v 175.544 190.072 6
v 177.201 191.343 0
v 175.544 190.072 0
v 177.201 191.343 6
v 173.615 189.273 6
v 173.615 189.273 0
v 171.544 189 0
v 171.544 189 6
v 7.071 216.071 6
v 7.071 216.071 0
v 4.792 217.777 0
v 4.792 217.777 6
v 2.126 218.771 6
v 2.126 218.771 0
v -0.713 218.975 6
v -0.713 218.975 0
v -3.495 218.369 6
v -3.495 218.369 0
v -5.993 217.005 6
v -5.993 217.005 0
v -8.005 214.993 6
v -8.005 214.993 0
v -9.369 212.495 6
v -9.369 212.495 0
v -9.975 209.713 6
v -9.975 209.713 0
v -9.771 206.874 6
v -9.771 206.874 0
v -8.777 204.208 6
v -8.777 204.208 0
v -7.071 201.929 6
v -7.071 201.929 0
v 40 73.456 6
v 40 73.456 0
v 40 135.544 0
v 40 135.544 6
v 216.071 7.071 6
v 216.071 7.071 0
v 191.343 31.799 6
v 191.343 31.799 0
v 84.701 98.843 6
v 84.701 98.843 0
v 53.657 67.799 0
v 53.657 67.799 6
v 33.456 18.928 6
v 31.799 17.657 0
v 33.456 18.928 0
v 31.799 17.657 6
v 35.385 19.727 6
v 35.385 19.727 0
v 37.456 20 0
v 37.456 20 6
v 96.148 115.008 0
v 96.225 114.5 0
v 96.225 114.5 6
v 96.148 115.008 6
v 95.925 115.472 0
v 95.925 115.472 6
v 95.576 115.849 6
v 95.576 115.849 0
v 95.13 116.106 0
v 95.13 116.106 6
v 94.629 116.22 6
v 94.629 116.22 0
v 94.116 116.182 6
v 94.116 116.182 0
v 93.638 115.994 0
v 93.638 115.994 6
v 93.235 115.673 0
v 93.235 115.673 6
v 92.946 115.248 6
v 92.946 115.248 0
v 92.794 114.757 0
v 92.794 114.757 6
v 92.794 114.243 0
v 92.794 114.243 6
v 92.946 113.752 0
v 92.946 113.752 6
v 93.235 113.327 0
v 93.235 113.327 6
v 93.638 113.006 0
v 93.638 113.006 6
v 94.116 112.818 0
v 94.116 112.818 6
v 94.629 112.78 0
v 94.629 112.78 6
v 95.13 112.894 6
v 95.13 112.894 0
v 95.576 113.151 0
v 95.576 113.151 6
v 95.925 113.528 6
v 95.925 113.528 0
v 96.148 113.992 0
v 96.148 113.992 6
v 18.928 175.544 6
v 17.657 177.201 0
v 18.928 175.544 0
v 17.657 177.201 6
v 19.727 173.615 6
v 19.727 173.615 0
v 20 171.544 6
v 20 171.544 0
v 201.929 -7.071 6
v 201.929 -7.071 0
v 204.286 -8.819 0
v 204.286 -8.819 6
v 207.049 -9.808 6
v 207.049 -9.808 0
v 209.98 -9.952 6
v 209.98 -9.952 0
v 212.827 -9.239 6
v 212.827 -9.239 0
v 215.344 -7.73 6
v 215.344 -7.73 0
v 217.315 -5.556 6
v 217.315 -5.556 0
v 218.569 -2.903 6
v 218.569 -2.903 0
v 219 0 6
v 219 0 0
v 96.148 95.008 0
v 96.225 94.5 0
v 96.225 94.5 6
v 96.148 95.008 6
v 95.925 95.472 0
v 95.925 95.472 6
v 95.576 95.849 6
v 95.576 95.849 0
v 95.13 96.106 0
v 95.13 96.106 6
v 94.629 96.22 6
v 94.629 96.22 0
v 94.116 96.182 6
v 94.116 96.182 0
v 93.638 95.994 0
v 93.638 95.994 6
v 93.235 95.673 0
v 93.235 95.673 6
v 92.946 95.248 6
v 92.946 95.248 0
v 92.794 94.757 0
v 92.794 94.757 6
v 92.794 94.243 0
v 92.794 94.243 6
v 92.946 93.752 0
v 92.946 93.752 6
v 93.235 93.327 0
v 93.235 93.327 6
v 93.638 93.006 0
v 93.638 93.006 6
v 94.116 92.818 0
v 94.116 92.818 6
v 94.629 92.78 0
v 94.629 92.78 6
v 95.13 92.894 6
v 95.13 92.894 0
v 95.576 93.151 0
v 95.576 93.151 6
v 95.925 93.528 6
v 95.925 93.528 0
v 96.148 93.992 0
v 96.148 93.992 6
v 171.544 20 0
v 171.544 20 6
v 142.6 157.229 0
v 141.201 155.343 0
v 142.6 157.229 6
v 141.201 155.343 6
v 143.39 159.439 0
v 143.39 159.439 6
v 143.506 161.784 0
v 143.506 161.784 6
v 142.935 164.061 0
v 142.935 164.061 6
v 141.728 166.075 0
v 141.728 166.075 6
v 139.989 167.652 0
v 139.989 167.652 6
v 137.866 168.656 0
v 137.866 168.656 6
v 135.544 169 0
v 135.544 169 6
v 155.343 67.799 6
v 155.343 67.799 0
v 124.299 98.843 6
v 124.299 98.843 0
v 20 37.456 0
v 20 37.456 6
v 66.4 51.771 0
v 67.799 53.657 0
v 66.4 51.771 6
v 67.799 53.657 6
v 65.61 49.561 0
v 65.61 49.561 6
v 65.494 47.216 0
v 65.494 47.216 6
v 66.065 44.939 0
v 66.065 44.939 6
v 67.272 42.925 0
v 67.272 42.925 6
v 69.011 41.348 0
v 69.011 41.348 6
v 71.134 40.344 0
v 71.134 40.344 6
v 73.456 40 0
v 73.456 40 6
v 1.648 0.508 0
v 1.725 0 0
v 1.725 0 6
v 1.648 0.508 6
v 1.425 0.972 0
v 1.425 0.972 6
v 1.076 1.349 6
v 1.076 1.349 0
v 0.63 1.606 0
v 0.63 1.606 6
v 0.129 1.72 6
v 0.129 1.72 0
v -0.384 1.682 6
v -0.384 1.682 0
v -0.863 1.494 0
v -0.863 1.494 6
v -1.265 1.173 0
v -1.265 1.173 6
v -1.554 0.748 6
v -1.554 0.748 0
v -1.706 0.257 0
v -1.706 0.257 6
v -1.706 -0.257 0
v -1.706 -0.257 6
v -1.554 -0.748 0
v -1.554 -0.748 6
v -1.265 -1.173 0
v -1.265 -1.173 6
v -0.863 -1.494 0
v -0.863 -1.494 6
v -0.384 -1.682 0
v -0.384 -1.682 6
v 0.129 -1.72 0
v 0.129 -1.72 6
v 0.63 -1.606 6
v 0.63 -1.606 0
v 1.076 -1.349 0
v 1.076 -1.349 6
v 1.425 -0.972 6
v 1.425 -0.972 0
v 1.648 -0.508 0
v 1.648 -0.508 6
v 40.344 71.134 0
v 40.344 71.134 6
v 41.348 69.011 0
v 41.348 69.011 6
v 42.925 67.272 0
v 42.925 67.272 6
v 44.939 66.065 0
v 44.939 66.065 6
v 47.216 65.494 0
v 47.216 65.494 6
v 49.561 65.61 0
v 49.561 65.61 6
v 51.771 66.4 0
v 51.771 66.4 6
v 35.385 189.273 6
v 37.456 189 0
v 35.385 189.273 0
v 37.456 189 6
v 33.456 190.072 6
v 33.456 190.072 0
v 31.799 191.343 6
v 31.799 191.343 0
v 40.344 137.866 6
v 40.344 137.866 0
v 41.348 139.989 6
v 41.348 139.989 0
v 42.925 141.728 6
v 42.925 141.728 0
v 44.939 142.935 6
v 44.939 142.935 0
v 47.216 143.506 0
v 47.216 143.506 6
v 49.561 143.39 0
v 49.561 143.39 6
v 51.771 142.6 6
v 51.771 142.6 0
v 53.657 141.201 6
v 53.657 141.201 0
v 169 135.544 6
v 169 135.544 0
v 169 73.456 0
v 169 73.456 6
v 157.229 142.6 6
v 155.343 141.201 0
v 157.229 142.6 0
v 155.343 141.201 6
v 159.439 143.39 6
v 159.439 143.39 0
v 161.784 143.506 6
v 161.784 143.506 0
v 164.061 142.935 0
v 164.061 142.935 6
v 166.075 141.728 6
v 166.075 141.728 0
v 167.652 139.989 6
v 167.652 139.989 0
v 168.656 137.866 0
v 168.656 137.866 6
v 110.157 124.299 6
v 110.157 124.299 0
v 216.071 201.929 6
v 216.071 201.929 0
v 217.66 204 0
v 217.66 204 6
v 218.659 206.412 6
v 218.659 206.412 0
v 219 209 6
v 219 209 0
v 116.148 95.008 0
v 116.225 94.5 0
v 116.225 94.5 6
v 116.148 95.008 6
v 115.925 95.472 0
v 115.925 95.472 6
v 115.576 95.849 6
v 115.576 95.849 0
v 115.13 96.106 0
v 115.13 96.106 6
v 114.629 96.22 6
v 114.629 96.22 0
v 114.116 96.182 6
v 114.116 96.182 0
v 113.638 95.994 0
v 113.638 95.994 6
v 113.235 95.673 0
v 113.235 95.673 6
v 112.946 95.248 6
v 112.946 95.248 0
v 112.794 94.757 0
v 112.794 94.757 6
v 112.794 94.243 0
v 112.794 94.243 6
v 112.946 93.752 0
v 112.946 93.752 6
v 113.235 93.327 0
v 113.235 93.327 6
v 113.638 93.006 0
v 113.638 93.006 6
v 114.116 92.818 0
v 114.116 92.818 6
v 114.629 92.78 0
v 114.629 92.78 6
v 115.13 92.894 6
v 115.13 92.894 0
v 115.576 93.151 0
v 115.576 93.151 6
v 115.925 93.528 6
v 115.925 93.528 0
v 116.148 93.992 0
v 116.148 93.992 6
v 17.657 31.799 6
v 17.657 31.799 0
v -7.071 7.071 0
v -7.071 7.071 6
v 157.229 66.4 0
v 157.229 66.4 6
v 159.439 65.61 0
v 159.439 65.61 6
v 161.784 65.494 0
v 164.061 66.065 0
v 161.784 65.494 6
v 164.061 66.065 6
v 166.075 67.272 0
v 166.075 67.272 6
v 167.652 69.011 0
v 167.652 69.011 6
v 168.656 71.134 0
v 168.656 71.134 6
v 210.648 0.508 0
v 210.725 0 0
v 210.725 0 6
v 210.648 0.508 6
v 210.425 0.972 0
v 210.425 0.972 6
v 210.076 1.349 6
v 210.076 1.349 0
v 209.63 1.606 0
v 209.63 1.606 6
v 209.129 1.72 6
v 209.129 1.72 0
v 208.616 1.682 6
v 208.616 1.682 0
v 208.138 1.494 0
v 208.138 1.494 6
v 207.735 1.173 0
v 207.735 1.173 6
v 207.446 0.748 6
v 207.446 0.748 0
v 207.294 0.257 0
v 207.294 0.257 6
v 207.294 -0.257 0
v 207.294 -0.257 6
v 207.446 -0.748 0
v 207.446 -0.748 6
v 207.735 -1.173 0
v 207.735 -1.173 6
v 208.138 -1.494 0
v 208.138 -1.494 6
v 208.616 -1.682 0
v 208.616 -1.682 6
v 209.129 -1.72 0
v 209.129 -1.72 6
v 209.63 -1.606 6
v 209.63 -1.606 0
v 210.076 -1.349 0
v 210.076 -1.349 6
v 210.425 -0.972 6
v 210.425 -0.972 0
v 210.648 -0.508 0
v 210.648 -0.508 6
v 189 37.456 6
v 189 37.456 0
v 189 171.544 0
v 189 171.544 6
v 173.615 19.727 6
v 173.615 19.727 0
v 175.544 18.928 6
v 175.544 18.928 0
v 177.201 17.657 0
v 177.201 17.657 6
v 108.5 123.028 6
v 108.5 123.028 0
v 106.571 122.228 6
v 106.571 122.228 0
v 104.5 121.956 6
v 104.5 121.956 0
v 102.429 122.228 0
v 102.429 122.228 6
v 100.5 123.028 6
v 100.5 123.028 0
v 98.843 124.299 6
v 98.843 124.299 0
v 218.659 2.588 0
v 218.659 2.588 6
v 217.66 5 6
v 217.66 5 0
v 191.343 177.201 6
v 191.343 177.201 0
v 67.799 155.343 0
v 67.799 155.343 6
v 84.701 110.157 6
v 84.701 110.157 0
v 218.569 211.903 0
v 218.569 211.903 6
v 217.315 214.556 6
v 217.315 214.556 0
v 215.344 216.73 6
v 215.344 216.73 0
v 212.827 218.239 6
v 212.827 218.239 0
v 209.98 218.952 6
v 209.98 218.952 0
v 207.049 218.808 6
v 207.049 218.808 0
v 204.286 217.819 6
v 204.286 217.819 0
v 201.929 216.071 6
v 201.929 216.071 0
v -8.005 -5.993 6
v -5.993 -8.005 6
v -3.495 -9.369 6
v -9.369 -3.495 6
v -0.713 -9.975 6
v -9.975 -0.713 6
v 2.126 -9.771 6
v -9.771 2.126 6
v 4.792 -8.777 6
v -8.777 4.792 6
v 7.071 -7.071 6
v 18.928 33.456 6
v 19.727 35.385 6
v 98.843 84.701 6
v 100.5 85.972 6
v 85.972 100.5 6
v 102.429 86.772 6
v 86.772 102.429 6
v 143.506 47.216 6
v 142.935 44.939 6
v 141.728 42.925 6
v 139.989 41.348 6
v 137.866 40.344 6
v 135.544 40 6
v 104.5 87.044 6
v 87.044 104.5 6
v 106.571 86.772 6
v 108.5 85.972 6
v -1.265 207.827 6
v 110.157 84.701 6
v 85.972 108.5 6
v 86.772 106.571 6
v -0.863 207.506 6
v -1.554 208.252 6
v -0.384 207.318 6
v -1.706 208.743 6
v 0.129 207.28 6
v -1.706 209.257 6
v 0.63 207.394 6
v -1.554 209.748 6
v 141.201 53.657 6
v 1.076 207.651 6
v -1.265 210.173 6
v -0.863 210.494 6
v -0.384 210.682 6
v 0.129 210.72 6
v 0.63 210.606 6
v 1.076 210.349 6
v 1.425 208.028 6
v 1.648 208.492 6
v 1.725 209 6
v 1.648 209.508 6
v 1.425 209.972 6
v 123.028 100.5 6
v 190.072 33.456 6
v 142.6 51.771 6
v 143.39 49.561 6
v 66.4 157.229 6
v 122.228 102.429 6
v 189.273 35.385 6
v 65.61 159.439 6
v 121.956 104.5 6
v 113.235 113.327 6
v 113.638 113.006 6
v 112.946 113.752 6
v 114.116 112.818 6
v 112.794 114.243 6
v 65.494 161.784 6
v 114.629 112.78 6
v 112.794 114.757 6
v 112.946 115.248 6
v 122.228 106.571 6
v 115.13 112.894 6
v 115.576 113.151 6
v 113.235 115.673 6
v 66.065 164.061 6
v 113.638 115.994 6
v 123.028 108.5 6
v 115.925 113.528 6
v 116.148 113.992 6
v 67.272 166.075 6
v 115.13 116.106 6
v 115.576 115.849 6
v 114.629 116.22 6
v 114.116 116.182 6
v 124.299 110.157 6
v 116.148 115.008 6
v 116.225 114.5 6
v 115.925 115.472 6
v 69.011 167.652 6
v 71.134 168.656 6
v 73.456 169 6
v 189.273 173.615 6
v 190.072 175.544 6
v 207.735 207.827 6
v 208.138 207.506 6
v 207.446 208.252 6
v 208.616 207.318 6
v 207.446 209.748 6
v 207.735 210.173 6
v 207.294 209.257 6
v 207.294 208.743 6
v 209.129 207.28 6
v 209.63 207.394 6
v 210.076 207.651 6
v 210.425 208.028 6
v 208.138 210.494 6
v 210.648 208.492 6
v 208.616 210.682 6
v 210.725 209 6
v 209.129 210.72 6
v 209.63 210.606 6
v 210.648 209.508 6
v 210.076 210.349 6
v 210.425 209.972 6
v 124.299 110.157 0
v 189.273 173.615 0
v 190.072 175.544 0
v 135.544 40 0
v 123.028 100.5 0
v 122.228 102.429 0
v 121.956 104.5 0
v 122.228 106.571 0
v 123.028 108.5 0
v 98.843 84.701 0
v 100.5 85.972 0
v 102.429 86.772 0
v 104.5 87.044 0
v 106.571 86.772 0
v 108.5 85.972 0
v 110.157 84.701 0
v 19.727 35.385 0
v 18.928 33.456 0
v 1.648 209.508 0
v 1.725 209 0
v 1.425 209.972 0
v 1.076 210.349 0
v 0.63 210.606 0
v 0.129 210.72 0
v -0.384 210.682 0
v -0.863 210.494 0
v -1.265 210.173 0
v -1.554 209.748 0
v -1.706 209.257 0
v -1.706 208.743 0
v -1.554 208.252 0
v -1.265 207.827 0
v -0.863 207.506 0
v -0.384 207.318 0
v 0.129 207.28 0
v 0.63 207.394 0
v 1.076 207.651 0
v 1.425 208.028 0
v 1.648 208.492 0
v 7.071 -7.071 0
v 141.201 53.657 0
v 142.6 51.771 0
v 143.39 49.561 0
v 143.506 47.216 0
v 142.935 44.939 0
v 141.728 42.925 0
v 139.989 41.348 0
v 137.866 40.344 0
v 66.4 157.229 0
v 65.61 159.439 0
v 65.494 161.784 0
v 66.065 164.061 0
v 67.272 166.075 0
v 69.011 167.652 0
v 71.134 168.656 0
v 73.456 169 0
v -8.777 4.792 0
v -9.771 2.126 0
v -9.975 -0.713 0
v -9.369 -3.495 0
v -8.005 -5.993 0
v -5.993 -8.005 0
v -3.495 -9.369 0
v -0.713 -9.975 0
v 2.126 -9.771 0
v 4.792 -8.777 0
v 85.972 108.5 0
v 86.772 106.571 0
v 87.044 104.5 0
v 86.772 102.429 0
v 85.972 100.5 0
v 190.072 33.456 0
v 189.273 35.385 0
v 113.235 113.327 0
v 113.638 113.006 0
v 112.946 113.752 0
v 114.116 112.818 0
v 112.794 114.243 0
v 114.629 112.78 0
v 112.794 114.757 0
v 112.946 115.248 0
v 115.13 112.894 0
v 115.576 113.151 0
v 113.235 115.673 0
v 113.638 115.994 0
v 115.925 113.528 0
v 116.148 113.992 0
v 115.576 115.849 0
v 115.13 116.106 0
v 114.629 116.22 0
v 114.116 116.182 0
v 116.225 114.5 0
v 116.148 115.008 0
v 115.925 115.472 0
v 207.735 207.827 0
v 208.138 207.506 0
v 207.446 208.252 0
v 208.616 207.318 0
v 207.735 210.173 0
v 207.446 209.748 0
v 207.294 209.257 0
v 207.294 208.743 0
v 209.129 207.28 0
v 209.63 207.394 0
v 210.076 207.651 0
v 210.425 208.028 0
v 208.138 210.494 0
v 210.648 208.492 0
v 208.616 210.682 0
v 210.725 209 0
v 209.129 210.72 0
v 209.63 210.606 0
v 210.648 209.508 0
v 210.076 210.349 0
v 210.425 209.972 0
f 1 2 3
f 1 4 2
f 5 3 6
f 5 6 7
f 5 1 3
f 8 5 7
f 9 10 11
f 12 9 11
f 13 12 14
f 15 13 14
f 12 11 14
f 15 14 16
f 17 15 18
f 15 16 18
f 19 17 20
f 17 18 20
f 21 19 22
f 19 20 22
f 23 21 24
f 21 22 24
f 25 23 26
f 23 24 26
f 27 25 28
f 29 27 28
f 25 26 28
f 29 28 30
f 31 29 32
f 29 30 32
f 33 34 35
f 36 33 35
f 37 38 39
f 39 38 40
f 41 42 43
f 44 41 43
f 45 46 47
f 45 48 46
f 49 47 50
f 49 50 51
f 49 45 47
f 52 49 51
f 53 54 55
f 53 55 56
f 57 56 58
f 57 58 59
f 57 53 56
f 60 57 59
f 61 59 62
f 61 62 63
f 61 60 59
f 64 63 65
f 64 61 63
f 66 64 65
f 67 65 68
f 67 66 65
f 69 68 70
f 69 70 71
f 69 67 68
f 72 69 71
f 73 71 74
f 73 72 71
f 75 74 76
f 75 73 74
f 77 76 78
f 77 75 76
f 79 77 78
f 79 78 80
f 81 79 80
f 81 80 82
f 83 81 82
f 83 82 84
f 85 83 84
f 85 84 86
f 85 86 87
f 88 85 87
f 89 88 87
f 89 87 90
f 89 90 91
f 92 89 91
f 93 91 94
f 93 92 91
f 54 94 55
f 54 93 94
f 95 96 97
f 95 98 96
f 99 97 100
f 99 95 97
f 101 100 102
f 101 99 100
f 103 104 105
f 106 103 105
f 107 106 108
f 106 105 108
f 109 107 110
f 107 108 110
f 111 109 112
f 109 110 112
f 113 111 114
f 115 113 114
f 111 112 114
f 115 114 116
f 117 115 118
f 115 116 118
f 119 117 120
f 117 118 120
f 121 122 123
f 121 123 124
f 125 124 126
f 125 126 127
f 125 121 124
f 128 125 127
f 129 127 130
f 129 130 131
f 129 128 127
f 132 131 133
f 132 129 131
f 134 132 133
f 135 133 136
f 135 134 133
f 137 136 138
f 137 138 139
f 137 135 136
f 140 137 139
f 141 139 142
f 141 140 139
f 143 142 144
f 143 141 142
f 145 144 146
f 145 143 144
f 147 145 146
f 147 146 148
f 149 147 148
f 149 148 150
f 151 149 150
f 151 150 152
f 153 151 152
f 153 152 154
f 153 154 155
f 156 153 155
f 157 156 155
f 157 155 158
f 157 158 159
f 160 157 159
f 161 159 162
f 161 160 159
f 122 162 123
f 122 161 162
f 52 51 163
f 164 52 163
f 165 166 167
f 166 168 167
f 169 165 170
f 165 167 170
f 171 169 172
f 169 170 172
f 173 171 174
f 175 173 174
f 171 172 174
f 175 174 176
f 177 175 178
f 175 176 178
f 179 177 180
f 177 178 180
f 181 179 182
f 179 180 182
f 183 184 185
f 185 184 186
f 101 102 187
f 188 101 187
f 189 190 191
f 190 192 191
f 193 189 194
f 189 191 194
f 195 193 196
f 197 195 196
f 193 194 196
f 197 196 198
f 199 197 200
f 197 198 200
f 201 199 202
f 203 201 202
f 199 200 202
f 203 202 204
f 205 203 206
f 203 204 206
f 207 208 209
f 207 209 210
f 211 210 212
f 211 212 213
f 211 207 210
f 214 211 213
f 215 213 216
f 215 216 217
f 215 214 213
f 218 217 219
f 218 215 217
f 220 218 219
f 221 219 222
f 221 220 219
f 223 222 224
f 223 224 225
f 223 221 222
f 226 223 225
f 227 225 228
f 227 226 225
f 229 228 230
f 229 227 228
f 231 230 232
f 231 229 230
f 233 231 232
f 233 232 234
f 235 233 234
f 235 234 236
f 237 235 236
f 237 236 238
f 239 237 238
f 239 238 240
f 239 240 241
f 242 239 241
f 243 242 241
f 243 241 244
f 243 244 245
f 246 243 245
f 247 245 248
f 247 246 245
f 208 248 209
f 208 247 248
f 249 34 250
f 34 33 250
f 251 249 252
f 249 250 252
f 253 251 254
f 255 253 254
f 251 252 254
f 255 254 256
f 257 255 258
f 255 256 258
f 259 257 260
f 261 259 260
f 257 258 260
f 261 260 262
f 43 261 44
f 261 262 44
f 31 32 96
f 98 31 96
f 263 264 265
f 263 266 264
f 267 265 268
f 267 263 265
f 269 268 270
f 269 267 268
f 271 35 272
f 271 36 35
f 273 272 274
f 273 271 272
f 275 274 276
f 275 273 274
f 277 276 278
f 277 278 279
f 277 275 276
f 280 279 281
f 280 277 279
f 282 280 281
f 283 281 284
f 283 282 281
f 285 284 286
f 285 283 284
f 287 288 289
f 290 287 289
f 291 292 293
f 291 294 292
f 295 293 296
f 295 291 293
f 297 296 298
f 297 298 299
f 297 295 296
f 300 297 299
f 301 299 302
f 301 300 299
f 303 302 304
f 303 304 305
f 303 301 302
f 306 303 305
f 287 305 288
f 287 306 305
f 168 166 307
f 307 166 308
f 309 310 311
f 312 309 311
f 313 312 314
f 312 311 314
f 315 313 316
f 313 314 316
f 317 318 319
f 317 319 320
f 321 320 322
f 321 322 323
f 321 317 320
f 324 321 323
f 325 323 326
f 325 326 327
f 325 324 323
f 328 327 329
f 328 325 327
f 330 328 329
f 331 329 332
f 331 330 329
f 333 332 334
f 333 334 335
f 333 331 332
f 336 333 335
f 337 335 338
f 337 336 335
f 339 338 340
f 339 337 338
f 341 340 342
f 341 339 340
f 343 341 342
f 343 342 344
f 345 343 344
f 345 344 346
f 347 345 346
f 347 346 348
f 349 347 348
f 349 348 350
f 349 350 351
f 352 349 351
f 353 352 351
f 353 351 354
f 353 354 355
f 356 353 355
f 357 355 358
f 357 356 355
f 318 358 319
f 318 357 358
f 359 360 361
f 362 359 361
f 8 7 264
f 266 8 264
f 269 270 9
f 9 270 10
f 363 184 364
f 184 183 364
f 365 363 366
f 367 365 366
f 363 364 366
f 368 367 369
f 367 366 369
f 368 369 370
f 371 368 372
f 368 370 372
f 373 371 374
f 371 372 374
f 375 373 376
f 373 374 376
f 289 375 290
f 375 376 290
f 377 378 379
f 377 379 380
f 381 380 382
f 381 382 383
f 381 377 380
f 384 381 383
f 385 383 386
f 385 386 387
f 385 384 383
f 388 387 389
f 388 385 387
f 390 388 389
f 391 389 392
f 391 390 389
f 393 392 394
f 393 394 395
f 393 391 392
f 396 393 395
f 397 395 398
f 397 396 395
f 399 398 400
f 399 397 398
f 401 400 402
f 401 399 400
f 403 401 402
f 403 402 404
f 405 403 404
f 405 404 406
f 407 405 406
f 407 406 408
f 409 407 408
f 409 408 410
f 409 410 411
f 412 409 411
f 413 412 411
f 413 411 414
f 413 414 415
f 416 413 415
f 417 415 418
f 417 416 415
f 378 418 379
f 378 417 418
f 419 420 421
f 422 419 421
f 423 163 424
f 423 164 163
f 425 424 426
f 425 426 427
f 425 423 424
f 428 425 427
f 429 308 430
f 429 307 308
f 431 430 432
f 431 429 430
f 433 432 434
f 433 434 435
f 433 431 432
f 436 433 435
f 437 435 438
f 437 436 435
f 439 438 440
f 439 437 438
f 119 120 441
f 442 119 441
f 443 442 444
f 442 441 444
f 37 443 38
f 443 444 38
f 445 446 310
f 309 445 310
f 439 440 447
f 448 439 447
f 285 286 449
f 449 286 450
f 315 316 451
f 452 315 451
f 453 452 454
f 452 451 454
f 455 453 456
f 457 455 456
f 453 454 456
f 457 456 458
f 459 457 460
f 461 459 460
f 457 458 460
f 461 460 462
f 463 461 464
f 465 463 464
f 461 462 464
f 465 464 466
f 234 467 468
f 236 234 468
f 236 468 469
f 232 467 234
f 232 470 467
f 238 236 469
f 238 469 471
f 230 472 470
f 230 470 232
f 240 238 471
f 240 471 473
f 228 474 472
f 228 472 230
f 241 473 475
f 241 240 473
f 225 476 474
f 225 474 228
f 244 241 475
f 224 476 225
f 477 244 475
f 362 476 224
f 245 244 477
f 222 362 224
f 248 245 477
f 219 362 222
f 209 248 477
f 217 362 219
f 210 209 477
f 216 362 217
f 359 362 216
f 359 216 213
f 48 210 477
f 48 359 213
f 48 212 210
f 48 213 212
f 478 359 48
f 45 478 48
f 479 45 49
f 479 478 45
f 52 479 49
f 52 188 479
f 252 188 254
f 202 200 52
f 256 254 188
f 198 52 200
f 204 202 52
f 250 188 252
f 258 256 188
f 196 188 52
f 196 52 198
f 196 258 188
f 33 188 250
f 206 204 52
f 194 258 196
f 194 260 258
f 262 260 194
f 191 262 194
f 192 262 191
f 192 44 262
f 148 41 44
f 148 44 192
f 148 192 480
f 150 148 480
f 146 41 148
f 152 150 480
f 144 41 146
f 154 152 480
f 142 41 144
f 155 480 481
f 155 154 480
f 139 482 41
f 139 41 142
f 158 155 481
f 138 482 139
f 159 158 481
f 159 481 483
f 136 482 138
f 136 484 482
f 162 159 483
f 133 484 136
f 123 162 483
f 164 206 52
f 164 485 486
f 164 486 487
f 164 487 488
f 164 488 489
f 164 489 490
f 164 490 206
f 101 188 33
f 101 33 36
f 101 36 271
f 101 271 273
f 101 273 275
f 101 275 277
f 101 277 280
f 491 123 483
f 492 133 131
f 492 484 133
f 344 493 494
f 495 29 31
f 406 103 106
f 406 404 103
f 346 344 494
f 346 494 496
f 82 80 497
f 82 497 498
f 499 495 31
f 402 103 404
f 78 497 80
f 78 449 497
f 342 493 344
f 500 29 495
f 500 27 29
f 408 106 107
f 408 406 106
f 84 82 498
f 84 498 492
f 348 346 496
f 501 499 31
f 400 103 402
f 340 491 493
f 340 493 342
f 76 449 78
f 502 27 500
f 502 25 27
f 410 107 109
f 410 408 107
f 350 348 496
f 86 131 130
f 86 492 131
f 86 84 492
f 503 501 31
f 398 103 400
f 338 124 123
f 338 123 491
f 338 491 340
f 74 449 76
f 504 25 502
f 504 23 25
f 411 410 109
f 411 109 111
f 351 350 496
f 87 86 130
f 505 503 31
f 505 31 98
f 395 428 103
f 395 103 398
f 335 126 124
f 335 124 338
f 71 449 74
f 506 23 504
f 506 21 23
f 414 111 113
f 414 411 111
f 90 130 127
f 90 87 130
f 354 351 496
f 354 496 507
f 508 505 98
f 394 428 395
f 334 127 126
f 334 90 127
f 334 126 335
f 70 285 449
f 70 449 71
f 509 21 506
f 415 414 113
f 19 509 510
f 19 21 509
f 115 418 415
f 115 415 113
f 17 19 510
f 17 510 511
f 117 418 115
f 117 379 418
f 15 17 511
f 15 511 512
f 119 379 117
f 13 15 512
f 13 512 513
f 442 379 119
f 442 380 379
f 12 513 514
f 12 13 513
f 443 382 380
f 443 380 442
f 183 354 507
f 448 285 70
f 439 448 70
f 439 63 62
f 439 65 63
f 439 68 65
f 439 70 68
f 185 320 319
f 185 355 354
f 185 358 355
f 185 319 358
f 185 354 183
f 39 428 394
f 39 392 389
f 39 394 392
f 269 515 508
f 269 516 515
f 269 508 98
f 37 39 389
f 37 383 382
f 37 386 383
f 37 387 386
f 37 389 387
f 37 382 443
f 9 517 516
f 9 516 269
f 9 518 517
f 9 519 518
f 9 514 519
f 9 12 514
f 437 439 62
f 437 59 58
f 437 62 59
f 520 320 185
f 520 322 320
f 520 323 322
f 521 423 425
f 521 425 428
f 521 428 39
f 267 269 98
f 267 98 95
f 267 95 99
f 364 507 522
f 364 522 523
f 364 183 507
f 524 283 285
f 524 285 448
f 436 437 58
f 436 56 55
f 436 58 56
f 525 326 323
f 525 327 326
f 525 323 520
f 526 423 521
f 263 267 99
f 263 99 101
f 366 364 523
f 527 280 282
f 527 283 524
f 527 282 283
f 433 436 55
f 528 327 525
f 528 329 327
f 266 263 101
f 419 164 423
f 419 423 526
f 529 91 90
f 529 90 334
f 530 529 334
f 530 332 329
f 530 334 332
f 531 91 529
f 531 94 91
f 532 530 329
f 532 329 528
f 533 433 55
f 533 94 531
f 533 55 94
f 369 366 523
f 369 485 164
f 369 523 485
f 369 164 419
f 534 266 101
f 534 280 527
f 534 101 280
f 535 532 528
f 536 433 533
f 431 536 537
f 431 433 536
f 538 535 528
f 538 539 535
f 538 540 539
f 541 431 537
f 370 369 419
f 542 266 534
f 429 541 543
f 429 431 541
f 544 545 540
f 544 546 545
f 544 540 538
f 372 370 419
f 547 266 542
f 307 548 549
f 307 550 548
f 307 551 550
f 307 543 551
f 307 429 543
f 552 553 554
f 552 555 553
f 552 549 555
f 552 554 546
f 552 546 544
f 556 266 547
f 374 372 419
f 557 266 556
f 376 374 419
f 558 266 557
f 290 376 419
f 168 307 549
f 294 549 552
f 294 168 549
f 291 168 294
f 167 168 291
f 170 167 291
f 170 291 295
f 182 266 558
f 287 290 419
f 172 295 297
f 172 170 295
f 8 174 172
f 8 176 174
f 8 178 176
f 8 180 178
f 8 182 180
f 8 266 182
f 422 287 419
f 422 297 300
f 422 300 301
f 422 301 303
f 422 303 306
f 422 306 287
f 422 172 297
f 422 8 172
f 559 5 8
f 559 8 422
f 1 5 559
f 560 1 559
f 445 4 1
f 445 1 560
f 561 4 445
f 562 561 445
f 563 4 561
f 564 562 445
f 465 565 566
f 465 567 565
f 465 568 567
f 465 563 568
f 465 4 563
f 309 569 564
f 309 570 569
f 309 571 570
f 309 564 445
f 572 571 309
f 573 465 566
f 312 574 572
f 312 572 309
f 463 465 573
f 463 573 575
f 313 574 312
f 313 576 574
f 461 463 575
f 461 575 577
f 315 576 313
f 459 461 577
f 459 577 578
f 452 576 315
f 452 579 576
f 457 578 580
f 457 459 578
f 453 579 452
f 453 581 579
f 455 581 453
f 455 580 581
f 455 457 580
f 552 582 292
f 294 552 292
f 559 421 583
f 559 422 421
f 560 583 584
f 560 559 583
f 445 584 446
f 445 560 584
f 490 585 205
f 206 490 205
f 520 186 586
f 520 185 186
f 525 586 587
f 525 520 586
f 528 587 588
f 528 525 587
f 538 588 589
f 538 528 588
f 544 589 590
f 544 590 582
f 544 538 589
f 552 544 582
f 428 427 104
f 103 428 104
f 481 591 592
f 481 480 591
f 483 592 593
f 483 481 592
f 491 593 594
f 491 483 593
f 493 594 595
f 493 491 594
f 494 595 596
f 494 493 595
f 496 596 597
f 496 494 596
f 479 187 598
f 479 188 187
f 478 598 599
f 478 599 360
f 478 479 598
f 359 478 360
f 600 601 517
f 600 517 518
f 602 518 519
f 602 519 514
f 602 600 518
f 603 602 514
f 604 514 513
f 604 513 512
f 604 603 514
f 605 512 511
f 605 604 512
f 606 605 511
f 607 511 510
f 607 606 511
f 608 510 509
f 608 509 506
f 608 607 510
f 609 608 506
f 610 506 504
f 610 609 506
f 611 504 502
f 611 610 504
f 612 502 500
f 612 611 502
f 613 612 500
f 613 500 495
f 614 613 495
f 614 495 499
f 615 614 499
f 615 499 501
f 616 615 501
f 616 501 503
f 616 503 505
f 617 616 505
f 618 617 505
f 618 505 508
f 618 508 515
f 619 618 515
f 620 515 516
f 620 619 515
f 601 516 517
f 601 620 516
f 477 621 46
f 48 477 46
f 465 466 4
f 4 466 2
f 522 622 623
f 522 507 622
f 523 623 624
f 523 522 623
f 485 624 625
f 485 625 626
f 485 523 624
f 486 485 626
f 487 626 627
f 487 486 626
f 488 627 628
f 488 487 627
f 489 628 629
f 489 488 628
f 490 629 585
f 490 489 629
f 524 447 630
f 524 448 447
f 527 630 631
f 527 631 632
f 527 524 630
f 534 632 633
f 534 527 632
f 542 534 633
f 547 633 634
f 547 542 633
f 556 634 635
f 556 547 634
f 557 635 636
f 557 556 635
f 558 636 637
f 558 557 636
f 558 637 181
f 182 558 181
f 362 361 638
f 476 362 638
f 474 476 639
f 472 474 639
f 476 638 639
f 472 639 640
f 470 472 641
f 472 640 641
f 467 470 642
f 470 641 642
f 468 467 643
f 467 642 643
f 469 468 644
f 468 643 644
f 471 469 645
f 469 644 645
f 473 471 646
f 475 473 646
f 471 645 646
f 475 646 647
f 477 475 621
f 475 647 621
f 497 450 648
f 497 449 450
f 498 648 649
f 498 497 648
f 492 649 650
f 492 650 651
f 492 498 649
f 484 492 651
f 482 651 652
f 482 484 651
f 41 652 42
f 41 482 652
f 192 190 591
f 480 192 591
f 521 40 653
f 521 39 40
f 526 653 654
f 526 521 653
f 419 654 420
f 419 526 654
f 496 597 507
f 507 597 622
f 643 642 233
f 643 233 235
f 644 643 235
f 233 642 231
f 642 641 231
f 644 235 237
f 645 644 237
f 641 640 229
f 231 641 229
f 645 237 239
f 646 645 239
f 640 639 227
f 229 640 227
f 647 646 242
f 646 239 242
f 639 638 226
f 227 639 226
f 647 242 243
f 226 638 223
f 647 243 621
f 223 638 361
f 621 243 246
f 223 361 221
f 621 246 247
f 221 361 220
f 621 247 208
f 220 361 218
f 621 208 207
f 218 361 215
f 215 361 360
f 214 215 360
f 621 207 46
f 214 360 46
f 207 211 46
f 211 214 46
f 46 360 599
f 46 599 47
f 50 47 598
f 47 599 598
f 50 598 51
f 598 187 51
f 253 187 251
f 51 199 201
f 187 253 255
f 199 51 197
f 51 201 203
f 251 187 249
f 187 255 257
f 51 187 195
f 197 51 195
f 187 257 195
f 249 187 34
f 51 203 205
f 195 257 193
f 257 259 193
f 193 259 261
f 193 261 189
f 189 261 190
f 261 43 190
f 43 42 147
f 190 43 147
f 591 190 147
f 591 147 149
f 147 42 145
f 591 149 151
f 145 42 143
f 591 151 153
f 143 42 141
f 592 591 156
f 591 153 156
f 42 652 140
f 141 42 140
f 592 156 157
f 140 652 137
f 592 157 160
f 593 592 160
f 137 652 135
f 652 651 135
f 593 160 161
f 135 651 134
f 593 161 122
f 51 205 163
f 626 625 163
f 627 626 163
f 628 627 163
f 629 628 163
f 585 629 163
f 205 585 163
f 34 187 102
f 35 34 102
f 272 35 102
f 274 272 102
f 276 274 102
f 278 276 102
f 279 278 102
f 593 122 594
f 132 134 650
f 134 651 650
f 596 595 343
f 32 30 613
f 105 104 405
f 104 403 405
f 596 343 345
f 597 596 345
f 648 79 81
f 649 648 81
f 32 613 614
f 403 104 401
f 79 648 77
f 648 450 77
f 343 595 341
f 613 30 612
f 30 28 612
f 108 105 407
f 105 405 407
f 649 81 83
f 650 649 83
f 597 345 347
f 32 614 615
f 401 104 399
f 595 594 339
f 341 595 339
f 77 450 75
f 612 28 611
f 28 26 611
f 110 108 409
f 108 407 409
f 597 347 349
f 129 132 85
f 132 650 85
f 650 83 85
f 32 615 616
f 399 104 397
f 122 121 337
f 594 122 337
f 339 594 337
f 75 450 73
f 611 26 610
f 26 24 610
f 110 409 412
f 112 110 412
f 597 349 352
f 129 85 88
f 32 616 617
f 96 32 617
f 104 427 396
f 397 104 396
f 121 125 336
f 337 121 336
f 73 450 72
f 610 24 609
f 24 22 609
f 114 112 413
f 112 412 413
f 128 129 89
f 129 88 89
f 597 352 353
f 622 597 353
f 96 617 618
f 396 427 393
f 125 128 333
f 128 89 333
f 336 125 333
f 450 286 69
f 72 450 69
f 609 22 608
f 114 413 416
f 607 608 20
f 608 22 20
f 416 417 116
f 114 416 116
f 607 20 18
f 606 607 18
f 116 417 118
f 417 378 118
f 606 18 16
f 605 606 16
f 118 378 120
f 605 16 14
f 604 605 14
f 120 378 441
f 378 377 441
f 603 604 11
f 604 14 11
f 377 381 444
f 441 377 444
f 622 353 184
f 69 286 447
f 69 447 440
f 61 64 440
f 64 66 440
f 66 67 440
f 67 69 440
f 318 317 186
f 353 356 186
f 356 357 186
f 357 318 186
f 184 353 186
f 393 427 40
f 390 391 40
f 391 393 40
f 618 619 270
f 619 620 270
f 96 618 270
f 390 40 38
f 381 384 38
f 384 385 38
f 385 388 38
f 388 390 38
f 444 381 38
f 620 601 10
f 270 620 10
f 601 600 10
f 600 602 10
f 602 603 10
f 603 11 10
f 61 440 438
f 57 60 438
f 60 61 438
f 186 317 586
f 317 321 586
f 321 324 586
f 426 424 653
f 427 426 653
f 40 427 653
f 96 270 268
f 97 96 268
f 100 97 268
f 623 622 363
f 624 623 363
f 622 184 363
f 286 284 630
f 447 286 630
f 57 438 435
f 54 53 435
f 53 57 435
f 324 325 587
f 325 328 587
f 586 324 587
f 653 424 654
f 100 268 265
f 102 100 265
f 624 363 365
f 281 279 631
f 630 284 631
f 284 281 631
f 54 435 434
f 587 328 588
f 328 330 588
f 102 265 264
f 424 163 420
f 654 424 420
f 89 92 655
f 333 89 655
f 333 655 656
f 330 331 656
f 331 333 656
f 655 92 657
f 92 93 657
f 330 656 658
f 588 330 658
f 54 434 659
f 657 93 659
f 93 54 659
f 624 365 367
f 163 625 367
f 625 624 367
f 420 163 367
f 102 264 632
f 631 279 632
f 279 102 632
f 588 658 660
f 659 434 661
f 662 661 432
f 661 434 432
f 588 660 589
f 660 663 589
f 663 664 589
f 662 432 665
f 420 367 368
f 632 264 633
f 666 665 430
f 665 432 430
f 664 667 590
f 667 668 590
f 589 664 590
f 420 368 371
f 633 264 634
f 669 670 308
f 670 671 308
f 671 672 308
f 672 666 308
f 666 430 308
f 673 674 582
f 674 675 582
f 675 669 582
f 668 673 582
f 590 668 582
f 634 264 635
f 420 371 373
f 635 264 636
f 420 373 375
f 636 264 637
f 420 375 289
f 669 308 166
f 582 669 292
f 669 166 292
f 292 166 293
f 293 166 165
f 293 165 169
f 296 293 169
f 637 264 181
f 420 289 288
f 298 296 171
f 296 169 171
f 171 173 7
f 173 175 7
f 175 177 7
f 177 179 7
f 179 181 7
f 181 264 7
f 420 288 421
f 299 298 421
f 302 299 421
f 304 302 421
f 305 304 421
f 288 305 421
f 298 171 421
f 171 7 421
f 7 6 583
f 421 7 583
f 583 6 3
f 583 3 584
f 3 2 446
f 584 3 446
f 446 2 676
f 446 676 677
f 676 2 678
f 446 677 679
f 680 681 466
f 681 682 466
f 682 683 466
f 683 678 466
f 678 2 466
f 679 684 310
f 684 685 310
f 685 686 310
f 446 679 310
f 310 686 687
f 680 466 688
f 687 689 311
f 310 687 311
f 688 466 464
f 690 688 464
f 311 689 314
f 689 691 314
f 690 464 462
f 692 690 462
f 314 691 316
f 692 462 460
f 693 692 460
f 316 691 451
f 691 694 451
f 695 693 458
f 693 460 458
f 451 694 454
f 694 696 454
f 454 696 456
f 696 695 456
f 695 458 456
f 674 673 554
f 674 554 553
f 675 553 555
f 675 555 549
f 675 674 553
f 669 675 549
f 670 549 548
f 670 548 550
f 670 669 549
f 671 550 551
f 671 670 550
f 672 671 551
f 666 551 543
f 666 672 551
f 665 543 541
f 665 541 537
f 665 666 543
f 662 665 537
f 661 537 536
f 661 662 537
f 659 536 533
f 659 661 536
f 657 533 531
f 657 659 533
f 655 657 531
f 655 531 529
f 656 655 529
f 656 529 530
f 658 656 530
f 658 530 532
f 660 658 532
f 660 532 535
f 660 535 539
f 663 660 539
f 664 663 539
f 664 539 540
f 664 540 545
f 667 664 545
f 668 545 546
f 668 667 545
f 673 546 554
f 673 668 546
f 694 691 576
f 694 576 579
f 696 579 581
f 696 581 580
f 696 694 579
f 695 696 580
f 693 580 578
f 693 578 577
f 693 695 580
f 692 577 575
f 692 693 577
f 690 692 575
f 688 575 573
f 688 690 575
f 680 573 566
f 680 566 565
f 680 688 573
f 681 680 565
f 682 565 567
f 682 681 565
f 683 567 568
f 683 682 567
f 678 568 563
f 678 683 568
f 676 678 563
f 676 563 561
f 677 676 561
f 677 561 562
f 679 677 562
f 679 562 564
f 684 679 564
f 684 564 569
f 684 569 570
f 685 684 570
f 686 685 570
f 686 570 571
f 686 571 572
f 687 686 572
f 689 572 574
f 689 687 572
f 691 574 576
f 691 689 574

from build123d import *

# Parameters (mm, degrees)
F0_R     = 1.725
F1_DEPTH = 6
F2_R     = 8


with BuildPart() as f1:
    # F0 (on Top) → F1 (new body)
    with BuildSketch(Plane.XY):
        with BuildLine():
            ThreePointArc((-7.0710678119, 201.9289321881), (3.8268343237, 199.7612046749), (10, 209))
            ThreePointArc((10, 209), (9.2387953251, 212.8268343237), (7.0710678119, 216.0710678119))
            ThreePointArc((7.0710678119, 216.0710678119), (-7.0710678119, 216.0710678119), (-7.0710678119, 201.9289321881))
        make_face()
        with Locations((0, 209)):
            Circle(F0_R, mode=Mode.SUBTRACT)
        with BuildLine():
            ThreePointArc((7.0710678119, 216.0710678119), (9.2387953251, 212.8268343237), (10, 209))
            ThreePointArc((10, 209), (3.8268343237, 199.7612046749), (-7.0710678119, 201.9289321881))
            Line((-7.0710678119, 201.9289321881), (20, 174.8578643763))
            Line((20, 174.8578643763), (40, 154.8578643763))
            Line((40, 154.8578643763), (90.3578643763, 104.5))
            Line((90.3578643763, 104.5), (104.5, 118.6421356237))
            Line((104.5, 118.6421356237), (54.1421356237, 169))
            Line((54.1421356237, 169), (34.1421356237, 189))
            Line((34.1421356237, 189), (7.0710678119, 216.0710678119))
        make_face()
        with Locations((94.5, 114.5)):
            Circle(F0_R, mode=Mode.SUBTRACT)
        Polygon((174.8578643763, 189), (34.1421356237, 189), (54.1421356237, 169), (154.8578643763, 169), align=None)
        Polygon((40, 154.8578643763), (20, 174.8578643763), (20, 34.1421356237), (40, 54.1421356237), align=None)
        with BuildLine():
            Line((201.9289321881, 216.0710678119), (174.8578643763, 189))
            Line((174.8578643763, 189), (154.8578643763, 169))
            Line((154.8578643763, 169), (104.5, 118.6421356237))
            Line((104.5, 118.6421356237), (118.6421356237, 104.5))
            Line((118.6421356237, 104.5), (169, 154.8578643763))
            Line((169, 154.8578643763), (189, 174.8578643763))
            Line((189, 174.8578643763), (216.0710678119, 201.9289321881))
            ThreePointArc((216.0710678119, 201.9289321881), (201.9289321881, 201.9289321881), (201.9289321881, 216.0710678119))
        make_face()
        with Locations((114.5, 114.5)):
            Circle(F0_R, mode=Mode.SUBTRACT)
        with BuildLine():
            Line((40, 54.1421356237), (20, 34.1421356237))
            Line((20, 34.1421356237), (-7.0710678119, 7.0710678119))
            ThreePointArc((-7.0710678119, 7.0710678119), (3.8268343237, 9.2387953251), (10, 0))
            ThreePointArc((10, 0), (9.2387953251, -3.8268343237), (7.0710678119, -7.0710678119))
            Line((7.0710678119, -7.0710678119), (34.1421356237, 20))
            Line((34.1421356237, 20), (54.1421356237, 40))
            Line((54.1421356237, 40), (104.5, 90.3578643763))
            Line((104.5, 90.3578643763), (90.3578643763, 104.5))
            Line((90.3578643763, 104.5), (40, 54.1421356237))
        make_face()
        with Locations((94.5, 94.5)):
            Circle(F0_R, mode=Mode.SUBTRACT)
        with BuildLine():
            ThreePointArc((219, 209), (212.8268343237, 218.2387953251), (201.9289321881, 216.0710678119))
            ThreePointArc((201.9289321881, 216.0710678119), (201.9289321881, 201.9289321881), (216.0710678119, 201.9289321881))
            ThreePointArc((216.0710678119, 201.9289321881), (218.2387953251, 205.1731656763), (219, 209))
        make_face()
        with Locations((209, 209)):
            Circle(F0_R, mode=Mode.SUBTRACT)
        with BuildLine():
            ThreePointArc((10, 0), (3.8268343237, 9.2387953251), (-7.0710678119, 7.0710678119))
            ThreePointArc((-7.0710678119, 7.0710678119), (-7.0710678119, -7.0710678119), (7.0710678119, -7.0710678119))
            ThreePointArc((7.0710678119, -7.0710678119), (9.2387953251, -3.8268343237), (10, 0))
        make_face()
        Circle(F0_R, mode=Mode.SUBTRACT)
        with BuildLine():
            Line((169, 54.1421356237), (118.6421356237, 104.5))
            Line((118.6421356237, 104.5), (104.5, 90.3578643763))
            Line((104.5, 90.3578643763), (154.8578643763, 40))
            Line((154.8578643763, 40), (174.8578643763, 20))
            Line((174.8578643763, 20), (201.9289321881, -7.0710678119))
            ThreePointArc((201.9289321881, -7.0710678119), (201.9289321881, 7.0710678119), (216.0710678119, 7.0710678119))
            Line((216.0710678119, 7.0710678119), (189, 34.1421356237))
            Line((189, 34.1421356237), (169, 54.1421356237))
        make_face()
        with Locations((114.5, 94.5)):
            Circle(F0_R, mode=Mode.SUBTRACT)
        Polygon((169, 154.8578643763), (169, 54.1421356237), (189, 34.1421356237), (189, 174.8578643763), align=None)
        Polygon((174.8578643763, 20), (154.8578643763, 40), (54.1421356237, 40), (34.1421356237, 20), align=None)
        with BuildLine():
            ThreePointArc((219, 0), (218.2387953251, 3.8268343237), (216.0710678119, 7.0710678119))
            ThreePointArc((216.0710678119, 7.0710678119), (201.9289321881, 7.0710678119), (201.9289321881, -7.0710678119))
            ThreePointArc((201.9289321881, -7.0710678119), (212.8268343237, -9.2387953251), (219, 0))
        make_face()
        with Locations((209, 0)):
            Circle(F0_R, mode=Mode.SUBTRACT)
        Polygon((118.6421356237, 104.5), (104.5, 118.6421356237), (90.3578643763, 104.5), (104.5, 90.3578643763), align=None)
    extrude(amount=F1_DEPTH)

    # F2
    f2_edges = [f1.edges().sort_by_distance(p)[0] for p in [
        (20, 174.857864, 3),
        (20, 34.142136, 3),
        (34.142136, 20, 3),
        (174.857864, 20, 3),
        (189, 174.857864, 3),
        (189, 34.142136, 3),
        (174.857864, 189, 3),
        (34.142136, 189, 3),
        (104.5, 118.642136, 3),
        (154.857864, 169, 3),
        (90.357864, 104.5, 3),
        (104.5, 90.357864, 3),
        (169, 154.857864, 3),
        (54.142136, 169, 3),
        (118.642136, 104.5, 3),
        (40, 54.142136, 3),
        (54.142136, 40, 3),
        (154.857864, 40, 3),
        (169, 54.142136, 3),
        (40, 154.857864, 3),
    ]]
    fillet(f2_edges, radius=F2_R)


solid = f1.part
